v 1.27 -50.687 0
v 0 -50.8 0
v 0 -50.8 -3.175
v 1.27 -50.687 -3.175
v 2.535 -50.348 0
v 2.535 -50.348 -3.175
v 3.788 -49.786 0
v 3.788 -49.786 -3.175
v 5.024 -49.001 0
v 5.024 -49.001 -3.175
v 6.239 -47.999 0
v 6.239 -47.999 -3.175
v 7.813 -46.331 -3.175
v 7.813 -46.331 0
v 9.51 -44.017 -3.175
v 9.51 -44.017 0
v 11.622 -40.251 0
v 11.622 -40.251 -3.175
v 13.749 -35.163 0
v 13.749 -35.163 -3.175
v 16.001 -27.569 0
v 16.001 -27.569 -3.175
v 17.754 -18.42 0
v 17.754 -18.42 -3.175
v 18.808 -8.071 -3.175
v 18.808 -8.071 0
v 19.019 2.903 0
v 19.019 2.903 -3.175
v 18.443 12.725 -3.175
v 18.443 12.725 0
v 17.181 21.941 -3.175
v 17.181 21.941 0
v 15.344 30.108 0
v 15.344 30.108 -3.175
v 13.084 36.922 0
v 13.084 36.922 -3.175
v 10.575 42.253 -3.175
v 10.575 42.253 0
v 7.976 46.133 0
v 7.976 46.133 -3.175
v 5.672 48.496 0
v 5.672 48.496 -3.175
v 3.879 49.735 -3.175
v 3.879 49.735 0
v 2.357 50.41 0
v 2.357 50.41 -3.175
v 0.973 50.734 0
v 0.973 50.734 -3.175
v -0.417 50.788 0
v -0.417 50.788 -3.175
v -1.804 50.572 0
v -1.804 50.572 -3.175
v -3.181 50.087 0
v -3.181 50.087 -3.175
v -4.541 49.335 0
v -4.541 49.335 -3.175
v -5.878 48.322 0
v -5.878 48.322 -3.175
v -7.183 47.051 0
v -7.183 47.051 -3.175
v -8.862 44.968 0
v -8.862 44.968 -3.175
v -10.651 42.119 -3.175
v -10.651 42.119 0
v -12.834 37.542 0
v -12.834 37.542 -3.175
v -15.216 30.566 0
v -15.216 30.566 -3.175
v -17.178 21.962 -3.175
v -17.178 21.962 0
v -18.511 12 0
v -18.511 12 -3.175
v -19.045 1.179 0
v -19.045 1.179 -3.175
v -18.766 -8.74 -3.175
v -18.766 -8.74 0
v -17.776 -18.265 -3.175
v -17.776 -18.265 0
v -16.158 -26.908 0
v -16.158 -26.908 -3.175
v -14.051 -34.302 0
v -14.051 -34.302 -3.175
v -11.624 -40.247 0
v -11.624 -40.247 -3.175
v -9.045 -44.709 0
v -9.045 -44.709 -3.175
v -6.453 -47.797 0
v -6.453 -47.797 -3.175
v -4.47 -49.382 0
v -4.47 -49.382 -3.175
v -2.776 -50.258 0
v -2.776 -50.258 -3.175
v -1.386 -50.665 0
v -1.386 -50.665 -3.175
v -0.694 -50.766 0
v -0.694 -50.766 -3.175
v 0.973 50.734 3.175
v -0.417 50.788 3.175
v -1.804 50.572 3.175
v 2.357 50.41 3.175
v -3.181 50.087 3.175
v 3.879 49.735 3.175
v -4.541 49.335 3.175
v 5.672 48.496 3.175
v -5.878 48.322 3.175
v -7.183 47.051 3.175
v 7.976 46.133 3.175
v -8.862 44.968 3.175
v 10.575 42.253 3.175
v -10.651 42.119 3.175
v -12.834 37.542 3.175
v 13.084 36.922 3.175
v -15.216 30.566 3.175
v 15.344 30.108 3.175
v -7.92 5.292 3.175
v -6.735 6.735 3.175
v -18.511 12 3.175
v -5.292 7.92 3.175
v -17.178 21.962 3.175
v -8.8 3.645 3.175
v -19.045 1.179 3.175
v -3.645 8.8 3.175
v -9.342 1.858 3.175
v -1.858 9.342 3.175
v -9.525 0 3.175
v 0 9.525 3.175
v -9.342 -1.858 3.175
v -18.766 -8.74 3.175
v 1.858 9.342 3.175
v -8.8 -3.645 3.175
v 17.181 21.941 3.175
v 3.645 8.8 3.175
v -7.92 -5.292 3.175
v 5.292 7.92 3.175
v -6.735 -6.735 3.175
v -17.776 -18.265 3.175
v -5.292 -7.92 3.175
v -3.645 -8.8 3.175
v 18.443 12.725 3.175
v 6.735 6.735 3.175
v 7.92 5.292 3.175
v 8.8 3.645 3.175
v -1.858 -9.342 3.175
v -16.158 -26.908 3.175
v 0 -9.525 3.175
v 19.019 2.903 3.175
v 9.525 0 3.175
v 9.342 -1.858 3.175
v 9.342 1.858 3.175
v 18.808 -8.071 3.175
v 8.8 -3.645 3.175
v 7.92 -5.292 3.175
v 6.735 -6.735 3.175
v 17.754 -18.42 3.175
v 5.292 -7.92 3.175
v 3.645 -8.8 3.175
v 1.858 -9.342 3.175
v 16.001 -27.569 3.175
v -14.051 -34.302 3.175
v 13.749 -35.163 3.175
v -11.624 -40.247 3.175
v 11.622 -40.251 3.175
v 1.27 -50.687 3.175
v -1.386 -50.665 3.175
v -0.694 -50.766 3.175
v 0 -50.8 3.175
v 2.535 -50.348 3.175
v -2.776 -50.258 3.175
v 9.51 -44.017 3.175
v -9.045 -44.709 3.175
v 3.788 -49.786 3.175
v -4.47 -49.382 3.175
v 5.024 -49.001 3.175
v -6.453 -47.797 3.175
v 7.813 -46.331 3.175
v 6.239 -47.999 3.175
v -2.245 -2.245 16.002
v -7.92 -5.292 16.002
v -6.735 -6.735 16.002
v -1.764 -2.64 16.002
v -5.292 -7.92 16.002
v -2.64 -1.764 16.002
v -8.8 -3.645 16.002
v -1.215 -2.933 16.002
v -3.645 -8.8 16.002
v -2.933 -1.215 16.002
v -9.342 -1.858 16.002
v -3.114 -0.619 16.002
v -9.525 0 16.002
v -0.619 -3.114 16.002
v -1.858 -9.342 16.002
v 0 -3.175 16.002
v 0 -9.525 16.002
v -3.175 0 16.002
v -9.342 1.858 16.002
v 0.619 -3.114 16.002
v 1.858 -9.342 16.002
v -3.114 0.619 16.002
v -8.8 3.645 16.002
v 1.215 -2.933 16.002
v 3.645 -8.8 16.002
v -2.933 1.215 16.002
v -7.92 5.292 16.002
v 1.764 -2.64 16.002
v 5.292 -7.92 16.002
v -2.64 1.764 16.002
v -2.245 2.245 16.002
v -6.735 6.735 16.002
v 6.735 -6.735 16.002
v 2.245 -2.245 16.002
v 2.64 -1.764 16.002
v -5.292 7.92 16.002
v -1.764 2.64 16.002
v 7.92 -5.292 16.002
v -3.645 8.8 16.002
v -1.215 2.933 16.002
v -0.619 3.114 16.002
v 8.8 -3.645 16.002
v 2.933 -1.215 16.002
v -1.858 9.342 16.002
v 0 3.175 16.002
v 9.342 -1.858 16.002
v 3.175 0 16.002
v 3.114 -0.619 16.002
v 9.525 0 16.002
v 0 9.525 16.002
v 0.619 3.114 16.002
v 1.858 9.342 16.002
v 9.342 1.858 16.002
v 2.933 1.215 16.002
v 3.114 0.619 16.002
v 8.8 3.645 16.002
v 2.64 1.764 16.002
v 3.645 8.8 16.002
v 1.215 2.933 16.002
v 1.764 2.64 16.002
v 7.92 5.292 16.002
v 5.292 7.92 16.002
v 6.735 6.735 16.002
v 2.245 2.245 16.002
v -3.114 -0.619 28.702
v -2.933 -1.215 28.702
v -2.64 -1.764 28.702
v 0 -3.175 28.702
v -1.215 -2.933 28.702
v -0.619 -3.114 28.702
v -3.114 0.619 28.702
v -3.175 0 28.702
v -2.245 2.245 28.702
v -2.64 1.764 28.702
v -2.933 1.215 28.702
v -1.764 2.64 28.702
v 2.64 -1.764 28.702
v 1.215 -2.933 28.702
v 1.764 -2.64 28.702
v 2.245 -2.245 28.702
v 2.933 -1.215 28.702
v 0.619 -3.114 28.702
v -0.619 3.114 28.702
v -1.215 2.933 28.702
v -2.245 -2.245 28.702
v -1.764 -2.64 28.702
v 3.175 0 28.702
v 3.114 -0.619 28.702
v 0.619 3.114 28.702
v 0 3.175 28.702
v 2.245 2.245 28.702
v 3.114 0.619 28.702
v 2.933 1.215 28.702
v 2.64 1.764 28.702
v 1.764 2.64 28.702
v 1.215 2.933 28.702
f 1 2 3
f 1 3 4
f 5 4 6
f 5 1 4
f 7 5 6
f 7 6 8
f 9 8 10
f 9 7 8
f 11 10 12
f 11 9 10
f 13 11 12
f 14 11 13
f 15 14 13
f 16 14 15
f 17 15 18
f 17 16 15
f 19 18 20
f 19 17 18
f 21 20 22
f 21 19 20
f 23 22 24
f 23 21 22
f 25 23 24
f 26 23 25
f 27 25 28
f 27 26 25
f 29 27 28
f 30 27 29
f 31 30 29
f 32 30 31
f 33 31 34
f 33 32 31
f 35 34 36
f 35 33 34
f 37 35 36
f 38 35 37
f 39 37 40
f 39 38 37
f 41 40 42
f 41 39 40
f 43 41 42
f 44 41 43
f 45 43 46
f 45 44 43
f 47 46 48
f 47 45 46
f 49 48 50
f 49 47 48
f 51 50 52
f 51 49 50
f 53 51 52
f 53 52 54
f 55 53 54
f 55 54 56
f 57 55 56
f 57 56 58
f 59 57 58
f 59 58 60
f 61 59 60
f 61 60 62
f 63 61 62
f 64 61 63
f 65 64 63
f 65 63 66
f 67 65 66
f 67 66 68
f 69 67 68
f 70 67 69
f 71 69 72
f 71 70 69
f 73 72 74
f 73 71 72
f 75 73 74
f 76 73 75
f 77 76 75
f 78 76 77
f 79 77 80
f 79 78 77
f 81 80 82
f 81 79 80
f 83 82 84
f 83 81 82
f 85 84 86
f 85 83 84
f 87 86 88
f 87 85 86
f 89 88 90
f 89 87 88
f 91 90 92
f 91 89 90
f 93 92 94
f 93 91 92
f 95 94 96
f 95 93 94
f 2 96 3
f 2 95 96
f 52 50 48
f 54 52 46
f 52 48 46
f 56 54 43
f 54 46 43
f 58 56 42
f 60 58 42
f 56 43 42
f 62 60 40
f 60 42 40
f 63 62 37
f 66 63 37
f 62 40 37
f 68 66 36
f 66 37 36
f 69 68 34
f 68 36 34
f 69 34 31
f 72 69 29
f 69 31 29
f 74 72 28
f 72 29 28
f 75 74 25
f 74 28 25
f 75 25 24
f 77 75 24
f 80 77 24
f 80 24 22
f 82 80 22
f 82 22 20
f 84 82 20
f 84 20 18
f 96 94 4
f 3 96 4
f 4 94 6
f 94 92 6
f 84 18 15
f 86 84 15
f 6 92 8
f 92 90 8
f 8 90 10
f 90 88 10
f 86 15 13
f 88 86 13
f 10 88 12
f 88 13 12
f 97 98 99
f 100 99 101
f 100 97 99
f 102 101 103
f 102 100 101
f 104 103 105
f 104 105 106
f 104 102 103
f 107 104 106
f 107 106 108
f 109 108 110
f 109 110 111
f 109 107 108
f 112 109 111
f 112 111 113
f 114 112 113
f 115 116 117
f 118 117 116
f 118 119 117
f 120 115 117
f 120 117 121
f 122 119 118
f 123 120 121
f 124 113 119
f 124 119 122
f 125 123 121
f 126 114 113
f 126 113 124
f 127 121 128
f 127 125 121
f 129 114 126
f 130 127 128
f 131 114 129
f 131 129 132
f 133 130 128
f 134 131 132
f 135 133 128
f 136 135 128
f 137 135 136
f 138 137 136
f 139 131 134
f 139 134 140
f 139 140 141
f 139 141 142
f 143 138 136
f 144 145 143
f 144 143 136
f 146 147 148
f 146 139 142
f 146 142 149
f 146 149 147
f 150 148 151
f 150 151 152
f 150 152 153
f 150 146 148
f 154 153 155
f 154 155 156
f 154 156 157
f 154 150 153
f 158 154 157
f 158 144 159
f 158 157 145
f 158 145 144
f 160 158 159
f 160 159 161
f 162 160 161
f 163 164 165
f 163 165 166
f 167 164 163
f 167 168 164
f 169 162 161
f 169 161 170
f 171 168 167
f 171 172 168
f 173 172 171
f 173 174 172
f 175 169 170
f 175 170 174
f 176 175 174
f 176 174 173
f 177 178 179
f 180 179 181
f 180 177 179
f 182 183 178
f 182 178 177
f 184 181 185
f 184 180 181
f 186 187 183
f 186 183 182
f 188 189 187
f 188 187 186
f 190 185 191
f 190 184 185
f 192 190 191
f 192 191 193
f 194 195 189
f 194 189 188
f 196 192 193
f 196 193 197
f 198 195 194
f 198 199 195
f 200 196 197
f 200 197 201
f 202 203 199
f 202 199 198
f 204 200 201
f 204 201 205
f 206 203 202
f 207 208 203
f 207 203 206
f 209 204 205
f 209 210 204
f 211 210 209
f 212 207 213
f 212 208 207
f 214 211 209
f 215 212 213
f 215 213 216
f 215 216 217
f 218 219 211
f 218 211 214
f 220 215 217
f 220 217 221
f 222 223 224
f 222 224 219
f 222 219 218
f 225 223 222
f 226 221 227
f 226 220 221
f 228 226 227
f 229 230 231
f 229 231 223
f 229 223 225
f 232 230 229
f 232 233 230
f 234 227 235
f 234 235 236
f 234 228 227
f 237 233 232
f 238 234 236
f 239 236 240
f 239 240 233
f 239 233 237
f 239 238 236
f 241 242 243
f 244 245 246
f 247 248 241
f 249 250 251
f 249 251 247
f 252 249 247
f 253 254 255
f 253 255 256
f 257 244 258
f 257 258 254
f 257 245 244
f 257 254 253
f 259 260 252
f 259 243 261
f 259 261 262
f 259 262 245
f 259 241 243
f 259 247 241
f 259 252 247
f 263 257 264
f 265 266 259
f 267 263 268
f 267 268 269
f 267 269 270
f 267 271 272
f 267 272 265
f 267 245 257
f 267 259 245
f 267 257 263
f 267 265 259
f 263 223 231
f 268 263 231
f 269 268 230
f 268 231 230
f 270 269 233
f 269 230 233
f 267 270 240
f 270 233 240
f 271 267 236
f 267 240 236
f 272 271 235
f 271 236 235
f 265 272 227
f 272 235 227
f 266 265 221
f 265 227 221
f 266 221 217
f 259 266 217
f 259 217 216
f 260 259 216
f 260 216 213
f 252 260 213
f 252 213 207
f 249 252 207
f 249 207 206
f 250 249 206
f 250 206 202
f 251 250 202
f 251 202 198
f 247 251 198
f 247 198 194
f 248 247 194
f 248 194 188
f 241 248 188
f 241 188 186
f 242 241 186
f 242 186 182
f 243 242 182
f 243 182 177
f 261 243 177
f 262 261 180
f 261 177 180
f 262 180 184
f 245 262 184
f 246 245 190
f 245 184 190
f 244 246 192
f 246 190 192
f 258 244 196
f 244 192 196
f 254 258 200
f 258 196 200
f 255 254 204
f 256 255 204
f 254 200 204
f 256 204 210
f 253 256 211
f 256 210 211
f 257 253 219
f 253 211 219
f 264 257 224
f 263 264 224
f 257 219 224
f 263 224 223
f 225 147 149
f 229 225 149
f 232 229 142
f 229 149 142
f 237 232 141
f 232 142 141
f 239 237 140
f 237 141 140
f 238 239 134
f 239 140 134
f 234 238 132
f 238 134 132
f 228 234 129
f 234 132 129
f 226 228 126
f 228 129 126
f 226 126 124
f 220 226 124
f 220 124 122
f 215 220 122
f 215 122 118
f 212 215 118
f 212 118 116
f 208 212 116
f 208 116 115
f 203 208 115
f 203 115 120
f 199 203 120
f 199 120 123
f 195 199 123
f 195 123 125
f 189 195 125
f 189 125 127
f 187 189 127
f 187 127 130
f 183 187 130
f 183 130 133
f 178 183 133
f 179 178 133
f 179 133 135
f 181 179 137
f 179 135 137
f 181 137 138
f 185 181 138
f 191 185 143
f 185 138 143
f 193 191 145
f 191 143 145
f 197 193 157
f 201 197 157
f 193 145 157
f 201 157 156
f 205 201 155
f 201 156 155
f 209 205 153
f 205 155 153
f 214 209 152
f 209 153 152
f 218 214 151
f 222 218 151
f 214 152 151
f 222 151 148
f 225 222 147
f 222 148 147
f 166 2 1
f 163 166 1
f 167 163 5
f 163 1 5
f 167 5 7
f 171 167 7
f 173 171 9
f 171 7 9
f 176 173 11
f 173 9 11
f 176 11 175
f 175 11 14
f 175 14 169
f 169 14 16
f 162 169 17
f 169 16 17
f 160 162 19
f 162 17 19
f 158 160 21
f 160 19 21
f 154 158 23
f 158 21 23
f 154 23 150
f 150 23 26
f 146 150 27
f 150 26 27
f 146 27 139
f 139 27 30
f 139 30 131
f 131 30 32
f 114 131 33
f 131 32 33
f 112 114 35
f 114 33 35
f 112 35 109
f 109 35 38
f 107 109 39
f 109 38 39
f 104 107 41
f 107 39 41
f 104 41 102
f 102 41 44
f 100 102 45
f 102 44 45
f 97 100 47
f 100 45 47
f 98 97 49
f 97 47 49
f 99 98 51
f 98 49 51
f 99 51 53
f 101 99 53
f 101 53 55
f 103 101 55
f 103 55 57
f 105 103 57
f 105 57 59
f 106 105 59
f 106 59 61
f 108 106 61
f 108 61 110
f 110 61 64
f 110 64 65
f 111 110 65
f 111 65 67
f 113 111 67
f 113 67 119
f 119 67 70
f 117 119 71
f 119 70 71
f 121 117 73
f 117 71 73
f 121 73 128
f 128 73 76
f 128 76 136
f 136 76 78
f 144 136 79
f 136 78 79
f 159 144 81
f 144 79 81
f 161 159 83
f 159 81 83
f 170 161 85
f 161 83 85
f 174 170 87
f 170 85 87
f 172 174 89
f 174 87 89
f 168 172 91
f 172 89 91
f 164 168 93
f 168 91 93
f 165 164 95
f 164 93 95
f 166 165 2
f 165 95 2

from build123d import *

# Parameters (mm, degrees)
SKETCH1_RX          = 50.8
SKETCH1_RY          = 19.05
BOSS_EXTRUDE1_DEPTH = 3.175
SKETCH2_R           = 9.525
BOSS_EXTRUDE2_DEPTH = 16.002
SKETCH3_R           = 3.175
BOSS_EXTRUDE3_DEPTH = 28.702


with BuildPart() as part:
    # Sketch1 → Boss-Extrude1 (new, symmetric)
    with BuildSketch(Plane.XY):
        with Locations(Location((0, 0), (0, 0, -90))):
            Ellipse(SKETCH1_RX, SKETCH1_RY)
    extrude(amount=BOSS_EXTRUDE1_DEPTH, both=True)

    # Sketch2 → Boss-Extrude2 (add)
    with BuildSketch(Plane.XY):
        Circle(SKETCH2_R)
    extrude(amount=BOSS_EXTRUDE2_DEPTH)

    # Sketch3 → Boss-Extrude3 (add)
    with BuildSketch(Plane.XY):
        Circle(SKETCH3_R)
    extrude(amount=BOSS_EXTRUDE3_DEPTH)


solid = part.part
